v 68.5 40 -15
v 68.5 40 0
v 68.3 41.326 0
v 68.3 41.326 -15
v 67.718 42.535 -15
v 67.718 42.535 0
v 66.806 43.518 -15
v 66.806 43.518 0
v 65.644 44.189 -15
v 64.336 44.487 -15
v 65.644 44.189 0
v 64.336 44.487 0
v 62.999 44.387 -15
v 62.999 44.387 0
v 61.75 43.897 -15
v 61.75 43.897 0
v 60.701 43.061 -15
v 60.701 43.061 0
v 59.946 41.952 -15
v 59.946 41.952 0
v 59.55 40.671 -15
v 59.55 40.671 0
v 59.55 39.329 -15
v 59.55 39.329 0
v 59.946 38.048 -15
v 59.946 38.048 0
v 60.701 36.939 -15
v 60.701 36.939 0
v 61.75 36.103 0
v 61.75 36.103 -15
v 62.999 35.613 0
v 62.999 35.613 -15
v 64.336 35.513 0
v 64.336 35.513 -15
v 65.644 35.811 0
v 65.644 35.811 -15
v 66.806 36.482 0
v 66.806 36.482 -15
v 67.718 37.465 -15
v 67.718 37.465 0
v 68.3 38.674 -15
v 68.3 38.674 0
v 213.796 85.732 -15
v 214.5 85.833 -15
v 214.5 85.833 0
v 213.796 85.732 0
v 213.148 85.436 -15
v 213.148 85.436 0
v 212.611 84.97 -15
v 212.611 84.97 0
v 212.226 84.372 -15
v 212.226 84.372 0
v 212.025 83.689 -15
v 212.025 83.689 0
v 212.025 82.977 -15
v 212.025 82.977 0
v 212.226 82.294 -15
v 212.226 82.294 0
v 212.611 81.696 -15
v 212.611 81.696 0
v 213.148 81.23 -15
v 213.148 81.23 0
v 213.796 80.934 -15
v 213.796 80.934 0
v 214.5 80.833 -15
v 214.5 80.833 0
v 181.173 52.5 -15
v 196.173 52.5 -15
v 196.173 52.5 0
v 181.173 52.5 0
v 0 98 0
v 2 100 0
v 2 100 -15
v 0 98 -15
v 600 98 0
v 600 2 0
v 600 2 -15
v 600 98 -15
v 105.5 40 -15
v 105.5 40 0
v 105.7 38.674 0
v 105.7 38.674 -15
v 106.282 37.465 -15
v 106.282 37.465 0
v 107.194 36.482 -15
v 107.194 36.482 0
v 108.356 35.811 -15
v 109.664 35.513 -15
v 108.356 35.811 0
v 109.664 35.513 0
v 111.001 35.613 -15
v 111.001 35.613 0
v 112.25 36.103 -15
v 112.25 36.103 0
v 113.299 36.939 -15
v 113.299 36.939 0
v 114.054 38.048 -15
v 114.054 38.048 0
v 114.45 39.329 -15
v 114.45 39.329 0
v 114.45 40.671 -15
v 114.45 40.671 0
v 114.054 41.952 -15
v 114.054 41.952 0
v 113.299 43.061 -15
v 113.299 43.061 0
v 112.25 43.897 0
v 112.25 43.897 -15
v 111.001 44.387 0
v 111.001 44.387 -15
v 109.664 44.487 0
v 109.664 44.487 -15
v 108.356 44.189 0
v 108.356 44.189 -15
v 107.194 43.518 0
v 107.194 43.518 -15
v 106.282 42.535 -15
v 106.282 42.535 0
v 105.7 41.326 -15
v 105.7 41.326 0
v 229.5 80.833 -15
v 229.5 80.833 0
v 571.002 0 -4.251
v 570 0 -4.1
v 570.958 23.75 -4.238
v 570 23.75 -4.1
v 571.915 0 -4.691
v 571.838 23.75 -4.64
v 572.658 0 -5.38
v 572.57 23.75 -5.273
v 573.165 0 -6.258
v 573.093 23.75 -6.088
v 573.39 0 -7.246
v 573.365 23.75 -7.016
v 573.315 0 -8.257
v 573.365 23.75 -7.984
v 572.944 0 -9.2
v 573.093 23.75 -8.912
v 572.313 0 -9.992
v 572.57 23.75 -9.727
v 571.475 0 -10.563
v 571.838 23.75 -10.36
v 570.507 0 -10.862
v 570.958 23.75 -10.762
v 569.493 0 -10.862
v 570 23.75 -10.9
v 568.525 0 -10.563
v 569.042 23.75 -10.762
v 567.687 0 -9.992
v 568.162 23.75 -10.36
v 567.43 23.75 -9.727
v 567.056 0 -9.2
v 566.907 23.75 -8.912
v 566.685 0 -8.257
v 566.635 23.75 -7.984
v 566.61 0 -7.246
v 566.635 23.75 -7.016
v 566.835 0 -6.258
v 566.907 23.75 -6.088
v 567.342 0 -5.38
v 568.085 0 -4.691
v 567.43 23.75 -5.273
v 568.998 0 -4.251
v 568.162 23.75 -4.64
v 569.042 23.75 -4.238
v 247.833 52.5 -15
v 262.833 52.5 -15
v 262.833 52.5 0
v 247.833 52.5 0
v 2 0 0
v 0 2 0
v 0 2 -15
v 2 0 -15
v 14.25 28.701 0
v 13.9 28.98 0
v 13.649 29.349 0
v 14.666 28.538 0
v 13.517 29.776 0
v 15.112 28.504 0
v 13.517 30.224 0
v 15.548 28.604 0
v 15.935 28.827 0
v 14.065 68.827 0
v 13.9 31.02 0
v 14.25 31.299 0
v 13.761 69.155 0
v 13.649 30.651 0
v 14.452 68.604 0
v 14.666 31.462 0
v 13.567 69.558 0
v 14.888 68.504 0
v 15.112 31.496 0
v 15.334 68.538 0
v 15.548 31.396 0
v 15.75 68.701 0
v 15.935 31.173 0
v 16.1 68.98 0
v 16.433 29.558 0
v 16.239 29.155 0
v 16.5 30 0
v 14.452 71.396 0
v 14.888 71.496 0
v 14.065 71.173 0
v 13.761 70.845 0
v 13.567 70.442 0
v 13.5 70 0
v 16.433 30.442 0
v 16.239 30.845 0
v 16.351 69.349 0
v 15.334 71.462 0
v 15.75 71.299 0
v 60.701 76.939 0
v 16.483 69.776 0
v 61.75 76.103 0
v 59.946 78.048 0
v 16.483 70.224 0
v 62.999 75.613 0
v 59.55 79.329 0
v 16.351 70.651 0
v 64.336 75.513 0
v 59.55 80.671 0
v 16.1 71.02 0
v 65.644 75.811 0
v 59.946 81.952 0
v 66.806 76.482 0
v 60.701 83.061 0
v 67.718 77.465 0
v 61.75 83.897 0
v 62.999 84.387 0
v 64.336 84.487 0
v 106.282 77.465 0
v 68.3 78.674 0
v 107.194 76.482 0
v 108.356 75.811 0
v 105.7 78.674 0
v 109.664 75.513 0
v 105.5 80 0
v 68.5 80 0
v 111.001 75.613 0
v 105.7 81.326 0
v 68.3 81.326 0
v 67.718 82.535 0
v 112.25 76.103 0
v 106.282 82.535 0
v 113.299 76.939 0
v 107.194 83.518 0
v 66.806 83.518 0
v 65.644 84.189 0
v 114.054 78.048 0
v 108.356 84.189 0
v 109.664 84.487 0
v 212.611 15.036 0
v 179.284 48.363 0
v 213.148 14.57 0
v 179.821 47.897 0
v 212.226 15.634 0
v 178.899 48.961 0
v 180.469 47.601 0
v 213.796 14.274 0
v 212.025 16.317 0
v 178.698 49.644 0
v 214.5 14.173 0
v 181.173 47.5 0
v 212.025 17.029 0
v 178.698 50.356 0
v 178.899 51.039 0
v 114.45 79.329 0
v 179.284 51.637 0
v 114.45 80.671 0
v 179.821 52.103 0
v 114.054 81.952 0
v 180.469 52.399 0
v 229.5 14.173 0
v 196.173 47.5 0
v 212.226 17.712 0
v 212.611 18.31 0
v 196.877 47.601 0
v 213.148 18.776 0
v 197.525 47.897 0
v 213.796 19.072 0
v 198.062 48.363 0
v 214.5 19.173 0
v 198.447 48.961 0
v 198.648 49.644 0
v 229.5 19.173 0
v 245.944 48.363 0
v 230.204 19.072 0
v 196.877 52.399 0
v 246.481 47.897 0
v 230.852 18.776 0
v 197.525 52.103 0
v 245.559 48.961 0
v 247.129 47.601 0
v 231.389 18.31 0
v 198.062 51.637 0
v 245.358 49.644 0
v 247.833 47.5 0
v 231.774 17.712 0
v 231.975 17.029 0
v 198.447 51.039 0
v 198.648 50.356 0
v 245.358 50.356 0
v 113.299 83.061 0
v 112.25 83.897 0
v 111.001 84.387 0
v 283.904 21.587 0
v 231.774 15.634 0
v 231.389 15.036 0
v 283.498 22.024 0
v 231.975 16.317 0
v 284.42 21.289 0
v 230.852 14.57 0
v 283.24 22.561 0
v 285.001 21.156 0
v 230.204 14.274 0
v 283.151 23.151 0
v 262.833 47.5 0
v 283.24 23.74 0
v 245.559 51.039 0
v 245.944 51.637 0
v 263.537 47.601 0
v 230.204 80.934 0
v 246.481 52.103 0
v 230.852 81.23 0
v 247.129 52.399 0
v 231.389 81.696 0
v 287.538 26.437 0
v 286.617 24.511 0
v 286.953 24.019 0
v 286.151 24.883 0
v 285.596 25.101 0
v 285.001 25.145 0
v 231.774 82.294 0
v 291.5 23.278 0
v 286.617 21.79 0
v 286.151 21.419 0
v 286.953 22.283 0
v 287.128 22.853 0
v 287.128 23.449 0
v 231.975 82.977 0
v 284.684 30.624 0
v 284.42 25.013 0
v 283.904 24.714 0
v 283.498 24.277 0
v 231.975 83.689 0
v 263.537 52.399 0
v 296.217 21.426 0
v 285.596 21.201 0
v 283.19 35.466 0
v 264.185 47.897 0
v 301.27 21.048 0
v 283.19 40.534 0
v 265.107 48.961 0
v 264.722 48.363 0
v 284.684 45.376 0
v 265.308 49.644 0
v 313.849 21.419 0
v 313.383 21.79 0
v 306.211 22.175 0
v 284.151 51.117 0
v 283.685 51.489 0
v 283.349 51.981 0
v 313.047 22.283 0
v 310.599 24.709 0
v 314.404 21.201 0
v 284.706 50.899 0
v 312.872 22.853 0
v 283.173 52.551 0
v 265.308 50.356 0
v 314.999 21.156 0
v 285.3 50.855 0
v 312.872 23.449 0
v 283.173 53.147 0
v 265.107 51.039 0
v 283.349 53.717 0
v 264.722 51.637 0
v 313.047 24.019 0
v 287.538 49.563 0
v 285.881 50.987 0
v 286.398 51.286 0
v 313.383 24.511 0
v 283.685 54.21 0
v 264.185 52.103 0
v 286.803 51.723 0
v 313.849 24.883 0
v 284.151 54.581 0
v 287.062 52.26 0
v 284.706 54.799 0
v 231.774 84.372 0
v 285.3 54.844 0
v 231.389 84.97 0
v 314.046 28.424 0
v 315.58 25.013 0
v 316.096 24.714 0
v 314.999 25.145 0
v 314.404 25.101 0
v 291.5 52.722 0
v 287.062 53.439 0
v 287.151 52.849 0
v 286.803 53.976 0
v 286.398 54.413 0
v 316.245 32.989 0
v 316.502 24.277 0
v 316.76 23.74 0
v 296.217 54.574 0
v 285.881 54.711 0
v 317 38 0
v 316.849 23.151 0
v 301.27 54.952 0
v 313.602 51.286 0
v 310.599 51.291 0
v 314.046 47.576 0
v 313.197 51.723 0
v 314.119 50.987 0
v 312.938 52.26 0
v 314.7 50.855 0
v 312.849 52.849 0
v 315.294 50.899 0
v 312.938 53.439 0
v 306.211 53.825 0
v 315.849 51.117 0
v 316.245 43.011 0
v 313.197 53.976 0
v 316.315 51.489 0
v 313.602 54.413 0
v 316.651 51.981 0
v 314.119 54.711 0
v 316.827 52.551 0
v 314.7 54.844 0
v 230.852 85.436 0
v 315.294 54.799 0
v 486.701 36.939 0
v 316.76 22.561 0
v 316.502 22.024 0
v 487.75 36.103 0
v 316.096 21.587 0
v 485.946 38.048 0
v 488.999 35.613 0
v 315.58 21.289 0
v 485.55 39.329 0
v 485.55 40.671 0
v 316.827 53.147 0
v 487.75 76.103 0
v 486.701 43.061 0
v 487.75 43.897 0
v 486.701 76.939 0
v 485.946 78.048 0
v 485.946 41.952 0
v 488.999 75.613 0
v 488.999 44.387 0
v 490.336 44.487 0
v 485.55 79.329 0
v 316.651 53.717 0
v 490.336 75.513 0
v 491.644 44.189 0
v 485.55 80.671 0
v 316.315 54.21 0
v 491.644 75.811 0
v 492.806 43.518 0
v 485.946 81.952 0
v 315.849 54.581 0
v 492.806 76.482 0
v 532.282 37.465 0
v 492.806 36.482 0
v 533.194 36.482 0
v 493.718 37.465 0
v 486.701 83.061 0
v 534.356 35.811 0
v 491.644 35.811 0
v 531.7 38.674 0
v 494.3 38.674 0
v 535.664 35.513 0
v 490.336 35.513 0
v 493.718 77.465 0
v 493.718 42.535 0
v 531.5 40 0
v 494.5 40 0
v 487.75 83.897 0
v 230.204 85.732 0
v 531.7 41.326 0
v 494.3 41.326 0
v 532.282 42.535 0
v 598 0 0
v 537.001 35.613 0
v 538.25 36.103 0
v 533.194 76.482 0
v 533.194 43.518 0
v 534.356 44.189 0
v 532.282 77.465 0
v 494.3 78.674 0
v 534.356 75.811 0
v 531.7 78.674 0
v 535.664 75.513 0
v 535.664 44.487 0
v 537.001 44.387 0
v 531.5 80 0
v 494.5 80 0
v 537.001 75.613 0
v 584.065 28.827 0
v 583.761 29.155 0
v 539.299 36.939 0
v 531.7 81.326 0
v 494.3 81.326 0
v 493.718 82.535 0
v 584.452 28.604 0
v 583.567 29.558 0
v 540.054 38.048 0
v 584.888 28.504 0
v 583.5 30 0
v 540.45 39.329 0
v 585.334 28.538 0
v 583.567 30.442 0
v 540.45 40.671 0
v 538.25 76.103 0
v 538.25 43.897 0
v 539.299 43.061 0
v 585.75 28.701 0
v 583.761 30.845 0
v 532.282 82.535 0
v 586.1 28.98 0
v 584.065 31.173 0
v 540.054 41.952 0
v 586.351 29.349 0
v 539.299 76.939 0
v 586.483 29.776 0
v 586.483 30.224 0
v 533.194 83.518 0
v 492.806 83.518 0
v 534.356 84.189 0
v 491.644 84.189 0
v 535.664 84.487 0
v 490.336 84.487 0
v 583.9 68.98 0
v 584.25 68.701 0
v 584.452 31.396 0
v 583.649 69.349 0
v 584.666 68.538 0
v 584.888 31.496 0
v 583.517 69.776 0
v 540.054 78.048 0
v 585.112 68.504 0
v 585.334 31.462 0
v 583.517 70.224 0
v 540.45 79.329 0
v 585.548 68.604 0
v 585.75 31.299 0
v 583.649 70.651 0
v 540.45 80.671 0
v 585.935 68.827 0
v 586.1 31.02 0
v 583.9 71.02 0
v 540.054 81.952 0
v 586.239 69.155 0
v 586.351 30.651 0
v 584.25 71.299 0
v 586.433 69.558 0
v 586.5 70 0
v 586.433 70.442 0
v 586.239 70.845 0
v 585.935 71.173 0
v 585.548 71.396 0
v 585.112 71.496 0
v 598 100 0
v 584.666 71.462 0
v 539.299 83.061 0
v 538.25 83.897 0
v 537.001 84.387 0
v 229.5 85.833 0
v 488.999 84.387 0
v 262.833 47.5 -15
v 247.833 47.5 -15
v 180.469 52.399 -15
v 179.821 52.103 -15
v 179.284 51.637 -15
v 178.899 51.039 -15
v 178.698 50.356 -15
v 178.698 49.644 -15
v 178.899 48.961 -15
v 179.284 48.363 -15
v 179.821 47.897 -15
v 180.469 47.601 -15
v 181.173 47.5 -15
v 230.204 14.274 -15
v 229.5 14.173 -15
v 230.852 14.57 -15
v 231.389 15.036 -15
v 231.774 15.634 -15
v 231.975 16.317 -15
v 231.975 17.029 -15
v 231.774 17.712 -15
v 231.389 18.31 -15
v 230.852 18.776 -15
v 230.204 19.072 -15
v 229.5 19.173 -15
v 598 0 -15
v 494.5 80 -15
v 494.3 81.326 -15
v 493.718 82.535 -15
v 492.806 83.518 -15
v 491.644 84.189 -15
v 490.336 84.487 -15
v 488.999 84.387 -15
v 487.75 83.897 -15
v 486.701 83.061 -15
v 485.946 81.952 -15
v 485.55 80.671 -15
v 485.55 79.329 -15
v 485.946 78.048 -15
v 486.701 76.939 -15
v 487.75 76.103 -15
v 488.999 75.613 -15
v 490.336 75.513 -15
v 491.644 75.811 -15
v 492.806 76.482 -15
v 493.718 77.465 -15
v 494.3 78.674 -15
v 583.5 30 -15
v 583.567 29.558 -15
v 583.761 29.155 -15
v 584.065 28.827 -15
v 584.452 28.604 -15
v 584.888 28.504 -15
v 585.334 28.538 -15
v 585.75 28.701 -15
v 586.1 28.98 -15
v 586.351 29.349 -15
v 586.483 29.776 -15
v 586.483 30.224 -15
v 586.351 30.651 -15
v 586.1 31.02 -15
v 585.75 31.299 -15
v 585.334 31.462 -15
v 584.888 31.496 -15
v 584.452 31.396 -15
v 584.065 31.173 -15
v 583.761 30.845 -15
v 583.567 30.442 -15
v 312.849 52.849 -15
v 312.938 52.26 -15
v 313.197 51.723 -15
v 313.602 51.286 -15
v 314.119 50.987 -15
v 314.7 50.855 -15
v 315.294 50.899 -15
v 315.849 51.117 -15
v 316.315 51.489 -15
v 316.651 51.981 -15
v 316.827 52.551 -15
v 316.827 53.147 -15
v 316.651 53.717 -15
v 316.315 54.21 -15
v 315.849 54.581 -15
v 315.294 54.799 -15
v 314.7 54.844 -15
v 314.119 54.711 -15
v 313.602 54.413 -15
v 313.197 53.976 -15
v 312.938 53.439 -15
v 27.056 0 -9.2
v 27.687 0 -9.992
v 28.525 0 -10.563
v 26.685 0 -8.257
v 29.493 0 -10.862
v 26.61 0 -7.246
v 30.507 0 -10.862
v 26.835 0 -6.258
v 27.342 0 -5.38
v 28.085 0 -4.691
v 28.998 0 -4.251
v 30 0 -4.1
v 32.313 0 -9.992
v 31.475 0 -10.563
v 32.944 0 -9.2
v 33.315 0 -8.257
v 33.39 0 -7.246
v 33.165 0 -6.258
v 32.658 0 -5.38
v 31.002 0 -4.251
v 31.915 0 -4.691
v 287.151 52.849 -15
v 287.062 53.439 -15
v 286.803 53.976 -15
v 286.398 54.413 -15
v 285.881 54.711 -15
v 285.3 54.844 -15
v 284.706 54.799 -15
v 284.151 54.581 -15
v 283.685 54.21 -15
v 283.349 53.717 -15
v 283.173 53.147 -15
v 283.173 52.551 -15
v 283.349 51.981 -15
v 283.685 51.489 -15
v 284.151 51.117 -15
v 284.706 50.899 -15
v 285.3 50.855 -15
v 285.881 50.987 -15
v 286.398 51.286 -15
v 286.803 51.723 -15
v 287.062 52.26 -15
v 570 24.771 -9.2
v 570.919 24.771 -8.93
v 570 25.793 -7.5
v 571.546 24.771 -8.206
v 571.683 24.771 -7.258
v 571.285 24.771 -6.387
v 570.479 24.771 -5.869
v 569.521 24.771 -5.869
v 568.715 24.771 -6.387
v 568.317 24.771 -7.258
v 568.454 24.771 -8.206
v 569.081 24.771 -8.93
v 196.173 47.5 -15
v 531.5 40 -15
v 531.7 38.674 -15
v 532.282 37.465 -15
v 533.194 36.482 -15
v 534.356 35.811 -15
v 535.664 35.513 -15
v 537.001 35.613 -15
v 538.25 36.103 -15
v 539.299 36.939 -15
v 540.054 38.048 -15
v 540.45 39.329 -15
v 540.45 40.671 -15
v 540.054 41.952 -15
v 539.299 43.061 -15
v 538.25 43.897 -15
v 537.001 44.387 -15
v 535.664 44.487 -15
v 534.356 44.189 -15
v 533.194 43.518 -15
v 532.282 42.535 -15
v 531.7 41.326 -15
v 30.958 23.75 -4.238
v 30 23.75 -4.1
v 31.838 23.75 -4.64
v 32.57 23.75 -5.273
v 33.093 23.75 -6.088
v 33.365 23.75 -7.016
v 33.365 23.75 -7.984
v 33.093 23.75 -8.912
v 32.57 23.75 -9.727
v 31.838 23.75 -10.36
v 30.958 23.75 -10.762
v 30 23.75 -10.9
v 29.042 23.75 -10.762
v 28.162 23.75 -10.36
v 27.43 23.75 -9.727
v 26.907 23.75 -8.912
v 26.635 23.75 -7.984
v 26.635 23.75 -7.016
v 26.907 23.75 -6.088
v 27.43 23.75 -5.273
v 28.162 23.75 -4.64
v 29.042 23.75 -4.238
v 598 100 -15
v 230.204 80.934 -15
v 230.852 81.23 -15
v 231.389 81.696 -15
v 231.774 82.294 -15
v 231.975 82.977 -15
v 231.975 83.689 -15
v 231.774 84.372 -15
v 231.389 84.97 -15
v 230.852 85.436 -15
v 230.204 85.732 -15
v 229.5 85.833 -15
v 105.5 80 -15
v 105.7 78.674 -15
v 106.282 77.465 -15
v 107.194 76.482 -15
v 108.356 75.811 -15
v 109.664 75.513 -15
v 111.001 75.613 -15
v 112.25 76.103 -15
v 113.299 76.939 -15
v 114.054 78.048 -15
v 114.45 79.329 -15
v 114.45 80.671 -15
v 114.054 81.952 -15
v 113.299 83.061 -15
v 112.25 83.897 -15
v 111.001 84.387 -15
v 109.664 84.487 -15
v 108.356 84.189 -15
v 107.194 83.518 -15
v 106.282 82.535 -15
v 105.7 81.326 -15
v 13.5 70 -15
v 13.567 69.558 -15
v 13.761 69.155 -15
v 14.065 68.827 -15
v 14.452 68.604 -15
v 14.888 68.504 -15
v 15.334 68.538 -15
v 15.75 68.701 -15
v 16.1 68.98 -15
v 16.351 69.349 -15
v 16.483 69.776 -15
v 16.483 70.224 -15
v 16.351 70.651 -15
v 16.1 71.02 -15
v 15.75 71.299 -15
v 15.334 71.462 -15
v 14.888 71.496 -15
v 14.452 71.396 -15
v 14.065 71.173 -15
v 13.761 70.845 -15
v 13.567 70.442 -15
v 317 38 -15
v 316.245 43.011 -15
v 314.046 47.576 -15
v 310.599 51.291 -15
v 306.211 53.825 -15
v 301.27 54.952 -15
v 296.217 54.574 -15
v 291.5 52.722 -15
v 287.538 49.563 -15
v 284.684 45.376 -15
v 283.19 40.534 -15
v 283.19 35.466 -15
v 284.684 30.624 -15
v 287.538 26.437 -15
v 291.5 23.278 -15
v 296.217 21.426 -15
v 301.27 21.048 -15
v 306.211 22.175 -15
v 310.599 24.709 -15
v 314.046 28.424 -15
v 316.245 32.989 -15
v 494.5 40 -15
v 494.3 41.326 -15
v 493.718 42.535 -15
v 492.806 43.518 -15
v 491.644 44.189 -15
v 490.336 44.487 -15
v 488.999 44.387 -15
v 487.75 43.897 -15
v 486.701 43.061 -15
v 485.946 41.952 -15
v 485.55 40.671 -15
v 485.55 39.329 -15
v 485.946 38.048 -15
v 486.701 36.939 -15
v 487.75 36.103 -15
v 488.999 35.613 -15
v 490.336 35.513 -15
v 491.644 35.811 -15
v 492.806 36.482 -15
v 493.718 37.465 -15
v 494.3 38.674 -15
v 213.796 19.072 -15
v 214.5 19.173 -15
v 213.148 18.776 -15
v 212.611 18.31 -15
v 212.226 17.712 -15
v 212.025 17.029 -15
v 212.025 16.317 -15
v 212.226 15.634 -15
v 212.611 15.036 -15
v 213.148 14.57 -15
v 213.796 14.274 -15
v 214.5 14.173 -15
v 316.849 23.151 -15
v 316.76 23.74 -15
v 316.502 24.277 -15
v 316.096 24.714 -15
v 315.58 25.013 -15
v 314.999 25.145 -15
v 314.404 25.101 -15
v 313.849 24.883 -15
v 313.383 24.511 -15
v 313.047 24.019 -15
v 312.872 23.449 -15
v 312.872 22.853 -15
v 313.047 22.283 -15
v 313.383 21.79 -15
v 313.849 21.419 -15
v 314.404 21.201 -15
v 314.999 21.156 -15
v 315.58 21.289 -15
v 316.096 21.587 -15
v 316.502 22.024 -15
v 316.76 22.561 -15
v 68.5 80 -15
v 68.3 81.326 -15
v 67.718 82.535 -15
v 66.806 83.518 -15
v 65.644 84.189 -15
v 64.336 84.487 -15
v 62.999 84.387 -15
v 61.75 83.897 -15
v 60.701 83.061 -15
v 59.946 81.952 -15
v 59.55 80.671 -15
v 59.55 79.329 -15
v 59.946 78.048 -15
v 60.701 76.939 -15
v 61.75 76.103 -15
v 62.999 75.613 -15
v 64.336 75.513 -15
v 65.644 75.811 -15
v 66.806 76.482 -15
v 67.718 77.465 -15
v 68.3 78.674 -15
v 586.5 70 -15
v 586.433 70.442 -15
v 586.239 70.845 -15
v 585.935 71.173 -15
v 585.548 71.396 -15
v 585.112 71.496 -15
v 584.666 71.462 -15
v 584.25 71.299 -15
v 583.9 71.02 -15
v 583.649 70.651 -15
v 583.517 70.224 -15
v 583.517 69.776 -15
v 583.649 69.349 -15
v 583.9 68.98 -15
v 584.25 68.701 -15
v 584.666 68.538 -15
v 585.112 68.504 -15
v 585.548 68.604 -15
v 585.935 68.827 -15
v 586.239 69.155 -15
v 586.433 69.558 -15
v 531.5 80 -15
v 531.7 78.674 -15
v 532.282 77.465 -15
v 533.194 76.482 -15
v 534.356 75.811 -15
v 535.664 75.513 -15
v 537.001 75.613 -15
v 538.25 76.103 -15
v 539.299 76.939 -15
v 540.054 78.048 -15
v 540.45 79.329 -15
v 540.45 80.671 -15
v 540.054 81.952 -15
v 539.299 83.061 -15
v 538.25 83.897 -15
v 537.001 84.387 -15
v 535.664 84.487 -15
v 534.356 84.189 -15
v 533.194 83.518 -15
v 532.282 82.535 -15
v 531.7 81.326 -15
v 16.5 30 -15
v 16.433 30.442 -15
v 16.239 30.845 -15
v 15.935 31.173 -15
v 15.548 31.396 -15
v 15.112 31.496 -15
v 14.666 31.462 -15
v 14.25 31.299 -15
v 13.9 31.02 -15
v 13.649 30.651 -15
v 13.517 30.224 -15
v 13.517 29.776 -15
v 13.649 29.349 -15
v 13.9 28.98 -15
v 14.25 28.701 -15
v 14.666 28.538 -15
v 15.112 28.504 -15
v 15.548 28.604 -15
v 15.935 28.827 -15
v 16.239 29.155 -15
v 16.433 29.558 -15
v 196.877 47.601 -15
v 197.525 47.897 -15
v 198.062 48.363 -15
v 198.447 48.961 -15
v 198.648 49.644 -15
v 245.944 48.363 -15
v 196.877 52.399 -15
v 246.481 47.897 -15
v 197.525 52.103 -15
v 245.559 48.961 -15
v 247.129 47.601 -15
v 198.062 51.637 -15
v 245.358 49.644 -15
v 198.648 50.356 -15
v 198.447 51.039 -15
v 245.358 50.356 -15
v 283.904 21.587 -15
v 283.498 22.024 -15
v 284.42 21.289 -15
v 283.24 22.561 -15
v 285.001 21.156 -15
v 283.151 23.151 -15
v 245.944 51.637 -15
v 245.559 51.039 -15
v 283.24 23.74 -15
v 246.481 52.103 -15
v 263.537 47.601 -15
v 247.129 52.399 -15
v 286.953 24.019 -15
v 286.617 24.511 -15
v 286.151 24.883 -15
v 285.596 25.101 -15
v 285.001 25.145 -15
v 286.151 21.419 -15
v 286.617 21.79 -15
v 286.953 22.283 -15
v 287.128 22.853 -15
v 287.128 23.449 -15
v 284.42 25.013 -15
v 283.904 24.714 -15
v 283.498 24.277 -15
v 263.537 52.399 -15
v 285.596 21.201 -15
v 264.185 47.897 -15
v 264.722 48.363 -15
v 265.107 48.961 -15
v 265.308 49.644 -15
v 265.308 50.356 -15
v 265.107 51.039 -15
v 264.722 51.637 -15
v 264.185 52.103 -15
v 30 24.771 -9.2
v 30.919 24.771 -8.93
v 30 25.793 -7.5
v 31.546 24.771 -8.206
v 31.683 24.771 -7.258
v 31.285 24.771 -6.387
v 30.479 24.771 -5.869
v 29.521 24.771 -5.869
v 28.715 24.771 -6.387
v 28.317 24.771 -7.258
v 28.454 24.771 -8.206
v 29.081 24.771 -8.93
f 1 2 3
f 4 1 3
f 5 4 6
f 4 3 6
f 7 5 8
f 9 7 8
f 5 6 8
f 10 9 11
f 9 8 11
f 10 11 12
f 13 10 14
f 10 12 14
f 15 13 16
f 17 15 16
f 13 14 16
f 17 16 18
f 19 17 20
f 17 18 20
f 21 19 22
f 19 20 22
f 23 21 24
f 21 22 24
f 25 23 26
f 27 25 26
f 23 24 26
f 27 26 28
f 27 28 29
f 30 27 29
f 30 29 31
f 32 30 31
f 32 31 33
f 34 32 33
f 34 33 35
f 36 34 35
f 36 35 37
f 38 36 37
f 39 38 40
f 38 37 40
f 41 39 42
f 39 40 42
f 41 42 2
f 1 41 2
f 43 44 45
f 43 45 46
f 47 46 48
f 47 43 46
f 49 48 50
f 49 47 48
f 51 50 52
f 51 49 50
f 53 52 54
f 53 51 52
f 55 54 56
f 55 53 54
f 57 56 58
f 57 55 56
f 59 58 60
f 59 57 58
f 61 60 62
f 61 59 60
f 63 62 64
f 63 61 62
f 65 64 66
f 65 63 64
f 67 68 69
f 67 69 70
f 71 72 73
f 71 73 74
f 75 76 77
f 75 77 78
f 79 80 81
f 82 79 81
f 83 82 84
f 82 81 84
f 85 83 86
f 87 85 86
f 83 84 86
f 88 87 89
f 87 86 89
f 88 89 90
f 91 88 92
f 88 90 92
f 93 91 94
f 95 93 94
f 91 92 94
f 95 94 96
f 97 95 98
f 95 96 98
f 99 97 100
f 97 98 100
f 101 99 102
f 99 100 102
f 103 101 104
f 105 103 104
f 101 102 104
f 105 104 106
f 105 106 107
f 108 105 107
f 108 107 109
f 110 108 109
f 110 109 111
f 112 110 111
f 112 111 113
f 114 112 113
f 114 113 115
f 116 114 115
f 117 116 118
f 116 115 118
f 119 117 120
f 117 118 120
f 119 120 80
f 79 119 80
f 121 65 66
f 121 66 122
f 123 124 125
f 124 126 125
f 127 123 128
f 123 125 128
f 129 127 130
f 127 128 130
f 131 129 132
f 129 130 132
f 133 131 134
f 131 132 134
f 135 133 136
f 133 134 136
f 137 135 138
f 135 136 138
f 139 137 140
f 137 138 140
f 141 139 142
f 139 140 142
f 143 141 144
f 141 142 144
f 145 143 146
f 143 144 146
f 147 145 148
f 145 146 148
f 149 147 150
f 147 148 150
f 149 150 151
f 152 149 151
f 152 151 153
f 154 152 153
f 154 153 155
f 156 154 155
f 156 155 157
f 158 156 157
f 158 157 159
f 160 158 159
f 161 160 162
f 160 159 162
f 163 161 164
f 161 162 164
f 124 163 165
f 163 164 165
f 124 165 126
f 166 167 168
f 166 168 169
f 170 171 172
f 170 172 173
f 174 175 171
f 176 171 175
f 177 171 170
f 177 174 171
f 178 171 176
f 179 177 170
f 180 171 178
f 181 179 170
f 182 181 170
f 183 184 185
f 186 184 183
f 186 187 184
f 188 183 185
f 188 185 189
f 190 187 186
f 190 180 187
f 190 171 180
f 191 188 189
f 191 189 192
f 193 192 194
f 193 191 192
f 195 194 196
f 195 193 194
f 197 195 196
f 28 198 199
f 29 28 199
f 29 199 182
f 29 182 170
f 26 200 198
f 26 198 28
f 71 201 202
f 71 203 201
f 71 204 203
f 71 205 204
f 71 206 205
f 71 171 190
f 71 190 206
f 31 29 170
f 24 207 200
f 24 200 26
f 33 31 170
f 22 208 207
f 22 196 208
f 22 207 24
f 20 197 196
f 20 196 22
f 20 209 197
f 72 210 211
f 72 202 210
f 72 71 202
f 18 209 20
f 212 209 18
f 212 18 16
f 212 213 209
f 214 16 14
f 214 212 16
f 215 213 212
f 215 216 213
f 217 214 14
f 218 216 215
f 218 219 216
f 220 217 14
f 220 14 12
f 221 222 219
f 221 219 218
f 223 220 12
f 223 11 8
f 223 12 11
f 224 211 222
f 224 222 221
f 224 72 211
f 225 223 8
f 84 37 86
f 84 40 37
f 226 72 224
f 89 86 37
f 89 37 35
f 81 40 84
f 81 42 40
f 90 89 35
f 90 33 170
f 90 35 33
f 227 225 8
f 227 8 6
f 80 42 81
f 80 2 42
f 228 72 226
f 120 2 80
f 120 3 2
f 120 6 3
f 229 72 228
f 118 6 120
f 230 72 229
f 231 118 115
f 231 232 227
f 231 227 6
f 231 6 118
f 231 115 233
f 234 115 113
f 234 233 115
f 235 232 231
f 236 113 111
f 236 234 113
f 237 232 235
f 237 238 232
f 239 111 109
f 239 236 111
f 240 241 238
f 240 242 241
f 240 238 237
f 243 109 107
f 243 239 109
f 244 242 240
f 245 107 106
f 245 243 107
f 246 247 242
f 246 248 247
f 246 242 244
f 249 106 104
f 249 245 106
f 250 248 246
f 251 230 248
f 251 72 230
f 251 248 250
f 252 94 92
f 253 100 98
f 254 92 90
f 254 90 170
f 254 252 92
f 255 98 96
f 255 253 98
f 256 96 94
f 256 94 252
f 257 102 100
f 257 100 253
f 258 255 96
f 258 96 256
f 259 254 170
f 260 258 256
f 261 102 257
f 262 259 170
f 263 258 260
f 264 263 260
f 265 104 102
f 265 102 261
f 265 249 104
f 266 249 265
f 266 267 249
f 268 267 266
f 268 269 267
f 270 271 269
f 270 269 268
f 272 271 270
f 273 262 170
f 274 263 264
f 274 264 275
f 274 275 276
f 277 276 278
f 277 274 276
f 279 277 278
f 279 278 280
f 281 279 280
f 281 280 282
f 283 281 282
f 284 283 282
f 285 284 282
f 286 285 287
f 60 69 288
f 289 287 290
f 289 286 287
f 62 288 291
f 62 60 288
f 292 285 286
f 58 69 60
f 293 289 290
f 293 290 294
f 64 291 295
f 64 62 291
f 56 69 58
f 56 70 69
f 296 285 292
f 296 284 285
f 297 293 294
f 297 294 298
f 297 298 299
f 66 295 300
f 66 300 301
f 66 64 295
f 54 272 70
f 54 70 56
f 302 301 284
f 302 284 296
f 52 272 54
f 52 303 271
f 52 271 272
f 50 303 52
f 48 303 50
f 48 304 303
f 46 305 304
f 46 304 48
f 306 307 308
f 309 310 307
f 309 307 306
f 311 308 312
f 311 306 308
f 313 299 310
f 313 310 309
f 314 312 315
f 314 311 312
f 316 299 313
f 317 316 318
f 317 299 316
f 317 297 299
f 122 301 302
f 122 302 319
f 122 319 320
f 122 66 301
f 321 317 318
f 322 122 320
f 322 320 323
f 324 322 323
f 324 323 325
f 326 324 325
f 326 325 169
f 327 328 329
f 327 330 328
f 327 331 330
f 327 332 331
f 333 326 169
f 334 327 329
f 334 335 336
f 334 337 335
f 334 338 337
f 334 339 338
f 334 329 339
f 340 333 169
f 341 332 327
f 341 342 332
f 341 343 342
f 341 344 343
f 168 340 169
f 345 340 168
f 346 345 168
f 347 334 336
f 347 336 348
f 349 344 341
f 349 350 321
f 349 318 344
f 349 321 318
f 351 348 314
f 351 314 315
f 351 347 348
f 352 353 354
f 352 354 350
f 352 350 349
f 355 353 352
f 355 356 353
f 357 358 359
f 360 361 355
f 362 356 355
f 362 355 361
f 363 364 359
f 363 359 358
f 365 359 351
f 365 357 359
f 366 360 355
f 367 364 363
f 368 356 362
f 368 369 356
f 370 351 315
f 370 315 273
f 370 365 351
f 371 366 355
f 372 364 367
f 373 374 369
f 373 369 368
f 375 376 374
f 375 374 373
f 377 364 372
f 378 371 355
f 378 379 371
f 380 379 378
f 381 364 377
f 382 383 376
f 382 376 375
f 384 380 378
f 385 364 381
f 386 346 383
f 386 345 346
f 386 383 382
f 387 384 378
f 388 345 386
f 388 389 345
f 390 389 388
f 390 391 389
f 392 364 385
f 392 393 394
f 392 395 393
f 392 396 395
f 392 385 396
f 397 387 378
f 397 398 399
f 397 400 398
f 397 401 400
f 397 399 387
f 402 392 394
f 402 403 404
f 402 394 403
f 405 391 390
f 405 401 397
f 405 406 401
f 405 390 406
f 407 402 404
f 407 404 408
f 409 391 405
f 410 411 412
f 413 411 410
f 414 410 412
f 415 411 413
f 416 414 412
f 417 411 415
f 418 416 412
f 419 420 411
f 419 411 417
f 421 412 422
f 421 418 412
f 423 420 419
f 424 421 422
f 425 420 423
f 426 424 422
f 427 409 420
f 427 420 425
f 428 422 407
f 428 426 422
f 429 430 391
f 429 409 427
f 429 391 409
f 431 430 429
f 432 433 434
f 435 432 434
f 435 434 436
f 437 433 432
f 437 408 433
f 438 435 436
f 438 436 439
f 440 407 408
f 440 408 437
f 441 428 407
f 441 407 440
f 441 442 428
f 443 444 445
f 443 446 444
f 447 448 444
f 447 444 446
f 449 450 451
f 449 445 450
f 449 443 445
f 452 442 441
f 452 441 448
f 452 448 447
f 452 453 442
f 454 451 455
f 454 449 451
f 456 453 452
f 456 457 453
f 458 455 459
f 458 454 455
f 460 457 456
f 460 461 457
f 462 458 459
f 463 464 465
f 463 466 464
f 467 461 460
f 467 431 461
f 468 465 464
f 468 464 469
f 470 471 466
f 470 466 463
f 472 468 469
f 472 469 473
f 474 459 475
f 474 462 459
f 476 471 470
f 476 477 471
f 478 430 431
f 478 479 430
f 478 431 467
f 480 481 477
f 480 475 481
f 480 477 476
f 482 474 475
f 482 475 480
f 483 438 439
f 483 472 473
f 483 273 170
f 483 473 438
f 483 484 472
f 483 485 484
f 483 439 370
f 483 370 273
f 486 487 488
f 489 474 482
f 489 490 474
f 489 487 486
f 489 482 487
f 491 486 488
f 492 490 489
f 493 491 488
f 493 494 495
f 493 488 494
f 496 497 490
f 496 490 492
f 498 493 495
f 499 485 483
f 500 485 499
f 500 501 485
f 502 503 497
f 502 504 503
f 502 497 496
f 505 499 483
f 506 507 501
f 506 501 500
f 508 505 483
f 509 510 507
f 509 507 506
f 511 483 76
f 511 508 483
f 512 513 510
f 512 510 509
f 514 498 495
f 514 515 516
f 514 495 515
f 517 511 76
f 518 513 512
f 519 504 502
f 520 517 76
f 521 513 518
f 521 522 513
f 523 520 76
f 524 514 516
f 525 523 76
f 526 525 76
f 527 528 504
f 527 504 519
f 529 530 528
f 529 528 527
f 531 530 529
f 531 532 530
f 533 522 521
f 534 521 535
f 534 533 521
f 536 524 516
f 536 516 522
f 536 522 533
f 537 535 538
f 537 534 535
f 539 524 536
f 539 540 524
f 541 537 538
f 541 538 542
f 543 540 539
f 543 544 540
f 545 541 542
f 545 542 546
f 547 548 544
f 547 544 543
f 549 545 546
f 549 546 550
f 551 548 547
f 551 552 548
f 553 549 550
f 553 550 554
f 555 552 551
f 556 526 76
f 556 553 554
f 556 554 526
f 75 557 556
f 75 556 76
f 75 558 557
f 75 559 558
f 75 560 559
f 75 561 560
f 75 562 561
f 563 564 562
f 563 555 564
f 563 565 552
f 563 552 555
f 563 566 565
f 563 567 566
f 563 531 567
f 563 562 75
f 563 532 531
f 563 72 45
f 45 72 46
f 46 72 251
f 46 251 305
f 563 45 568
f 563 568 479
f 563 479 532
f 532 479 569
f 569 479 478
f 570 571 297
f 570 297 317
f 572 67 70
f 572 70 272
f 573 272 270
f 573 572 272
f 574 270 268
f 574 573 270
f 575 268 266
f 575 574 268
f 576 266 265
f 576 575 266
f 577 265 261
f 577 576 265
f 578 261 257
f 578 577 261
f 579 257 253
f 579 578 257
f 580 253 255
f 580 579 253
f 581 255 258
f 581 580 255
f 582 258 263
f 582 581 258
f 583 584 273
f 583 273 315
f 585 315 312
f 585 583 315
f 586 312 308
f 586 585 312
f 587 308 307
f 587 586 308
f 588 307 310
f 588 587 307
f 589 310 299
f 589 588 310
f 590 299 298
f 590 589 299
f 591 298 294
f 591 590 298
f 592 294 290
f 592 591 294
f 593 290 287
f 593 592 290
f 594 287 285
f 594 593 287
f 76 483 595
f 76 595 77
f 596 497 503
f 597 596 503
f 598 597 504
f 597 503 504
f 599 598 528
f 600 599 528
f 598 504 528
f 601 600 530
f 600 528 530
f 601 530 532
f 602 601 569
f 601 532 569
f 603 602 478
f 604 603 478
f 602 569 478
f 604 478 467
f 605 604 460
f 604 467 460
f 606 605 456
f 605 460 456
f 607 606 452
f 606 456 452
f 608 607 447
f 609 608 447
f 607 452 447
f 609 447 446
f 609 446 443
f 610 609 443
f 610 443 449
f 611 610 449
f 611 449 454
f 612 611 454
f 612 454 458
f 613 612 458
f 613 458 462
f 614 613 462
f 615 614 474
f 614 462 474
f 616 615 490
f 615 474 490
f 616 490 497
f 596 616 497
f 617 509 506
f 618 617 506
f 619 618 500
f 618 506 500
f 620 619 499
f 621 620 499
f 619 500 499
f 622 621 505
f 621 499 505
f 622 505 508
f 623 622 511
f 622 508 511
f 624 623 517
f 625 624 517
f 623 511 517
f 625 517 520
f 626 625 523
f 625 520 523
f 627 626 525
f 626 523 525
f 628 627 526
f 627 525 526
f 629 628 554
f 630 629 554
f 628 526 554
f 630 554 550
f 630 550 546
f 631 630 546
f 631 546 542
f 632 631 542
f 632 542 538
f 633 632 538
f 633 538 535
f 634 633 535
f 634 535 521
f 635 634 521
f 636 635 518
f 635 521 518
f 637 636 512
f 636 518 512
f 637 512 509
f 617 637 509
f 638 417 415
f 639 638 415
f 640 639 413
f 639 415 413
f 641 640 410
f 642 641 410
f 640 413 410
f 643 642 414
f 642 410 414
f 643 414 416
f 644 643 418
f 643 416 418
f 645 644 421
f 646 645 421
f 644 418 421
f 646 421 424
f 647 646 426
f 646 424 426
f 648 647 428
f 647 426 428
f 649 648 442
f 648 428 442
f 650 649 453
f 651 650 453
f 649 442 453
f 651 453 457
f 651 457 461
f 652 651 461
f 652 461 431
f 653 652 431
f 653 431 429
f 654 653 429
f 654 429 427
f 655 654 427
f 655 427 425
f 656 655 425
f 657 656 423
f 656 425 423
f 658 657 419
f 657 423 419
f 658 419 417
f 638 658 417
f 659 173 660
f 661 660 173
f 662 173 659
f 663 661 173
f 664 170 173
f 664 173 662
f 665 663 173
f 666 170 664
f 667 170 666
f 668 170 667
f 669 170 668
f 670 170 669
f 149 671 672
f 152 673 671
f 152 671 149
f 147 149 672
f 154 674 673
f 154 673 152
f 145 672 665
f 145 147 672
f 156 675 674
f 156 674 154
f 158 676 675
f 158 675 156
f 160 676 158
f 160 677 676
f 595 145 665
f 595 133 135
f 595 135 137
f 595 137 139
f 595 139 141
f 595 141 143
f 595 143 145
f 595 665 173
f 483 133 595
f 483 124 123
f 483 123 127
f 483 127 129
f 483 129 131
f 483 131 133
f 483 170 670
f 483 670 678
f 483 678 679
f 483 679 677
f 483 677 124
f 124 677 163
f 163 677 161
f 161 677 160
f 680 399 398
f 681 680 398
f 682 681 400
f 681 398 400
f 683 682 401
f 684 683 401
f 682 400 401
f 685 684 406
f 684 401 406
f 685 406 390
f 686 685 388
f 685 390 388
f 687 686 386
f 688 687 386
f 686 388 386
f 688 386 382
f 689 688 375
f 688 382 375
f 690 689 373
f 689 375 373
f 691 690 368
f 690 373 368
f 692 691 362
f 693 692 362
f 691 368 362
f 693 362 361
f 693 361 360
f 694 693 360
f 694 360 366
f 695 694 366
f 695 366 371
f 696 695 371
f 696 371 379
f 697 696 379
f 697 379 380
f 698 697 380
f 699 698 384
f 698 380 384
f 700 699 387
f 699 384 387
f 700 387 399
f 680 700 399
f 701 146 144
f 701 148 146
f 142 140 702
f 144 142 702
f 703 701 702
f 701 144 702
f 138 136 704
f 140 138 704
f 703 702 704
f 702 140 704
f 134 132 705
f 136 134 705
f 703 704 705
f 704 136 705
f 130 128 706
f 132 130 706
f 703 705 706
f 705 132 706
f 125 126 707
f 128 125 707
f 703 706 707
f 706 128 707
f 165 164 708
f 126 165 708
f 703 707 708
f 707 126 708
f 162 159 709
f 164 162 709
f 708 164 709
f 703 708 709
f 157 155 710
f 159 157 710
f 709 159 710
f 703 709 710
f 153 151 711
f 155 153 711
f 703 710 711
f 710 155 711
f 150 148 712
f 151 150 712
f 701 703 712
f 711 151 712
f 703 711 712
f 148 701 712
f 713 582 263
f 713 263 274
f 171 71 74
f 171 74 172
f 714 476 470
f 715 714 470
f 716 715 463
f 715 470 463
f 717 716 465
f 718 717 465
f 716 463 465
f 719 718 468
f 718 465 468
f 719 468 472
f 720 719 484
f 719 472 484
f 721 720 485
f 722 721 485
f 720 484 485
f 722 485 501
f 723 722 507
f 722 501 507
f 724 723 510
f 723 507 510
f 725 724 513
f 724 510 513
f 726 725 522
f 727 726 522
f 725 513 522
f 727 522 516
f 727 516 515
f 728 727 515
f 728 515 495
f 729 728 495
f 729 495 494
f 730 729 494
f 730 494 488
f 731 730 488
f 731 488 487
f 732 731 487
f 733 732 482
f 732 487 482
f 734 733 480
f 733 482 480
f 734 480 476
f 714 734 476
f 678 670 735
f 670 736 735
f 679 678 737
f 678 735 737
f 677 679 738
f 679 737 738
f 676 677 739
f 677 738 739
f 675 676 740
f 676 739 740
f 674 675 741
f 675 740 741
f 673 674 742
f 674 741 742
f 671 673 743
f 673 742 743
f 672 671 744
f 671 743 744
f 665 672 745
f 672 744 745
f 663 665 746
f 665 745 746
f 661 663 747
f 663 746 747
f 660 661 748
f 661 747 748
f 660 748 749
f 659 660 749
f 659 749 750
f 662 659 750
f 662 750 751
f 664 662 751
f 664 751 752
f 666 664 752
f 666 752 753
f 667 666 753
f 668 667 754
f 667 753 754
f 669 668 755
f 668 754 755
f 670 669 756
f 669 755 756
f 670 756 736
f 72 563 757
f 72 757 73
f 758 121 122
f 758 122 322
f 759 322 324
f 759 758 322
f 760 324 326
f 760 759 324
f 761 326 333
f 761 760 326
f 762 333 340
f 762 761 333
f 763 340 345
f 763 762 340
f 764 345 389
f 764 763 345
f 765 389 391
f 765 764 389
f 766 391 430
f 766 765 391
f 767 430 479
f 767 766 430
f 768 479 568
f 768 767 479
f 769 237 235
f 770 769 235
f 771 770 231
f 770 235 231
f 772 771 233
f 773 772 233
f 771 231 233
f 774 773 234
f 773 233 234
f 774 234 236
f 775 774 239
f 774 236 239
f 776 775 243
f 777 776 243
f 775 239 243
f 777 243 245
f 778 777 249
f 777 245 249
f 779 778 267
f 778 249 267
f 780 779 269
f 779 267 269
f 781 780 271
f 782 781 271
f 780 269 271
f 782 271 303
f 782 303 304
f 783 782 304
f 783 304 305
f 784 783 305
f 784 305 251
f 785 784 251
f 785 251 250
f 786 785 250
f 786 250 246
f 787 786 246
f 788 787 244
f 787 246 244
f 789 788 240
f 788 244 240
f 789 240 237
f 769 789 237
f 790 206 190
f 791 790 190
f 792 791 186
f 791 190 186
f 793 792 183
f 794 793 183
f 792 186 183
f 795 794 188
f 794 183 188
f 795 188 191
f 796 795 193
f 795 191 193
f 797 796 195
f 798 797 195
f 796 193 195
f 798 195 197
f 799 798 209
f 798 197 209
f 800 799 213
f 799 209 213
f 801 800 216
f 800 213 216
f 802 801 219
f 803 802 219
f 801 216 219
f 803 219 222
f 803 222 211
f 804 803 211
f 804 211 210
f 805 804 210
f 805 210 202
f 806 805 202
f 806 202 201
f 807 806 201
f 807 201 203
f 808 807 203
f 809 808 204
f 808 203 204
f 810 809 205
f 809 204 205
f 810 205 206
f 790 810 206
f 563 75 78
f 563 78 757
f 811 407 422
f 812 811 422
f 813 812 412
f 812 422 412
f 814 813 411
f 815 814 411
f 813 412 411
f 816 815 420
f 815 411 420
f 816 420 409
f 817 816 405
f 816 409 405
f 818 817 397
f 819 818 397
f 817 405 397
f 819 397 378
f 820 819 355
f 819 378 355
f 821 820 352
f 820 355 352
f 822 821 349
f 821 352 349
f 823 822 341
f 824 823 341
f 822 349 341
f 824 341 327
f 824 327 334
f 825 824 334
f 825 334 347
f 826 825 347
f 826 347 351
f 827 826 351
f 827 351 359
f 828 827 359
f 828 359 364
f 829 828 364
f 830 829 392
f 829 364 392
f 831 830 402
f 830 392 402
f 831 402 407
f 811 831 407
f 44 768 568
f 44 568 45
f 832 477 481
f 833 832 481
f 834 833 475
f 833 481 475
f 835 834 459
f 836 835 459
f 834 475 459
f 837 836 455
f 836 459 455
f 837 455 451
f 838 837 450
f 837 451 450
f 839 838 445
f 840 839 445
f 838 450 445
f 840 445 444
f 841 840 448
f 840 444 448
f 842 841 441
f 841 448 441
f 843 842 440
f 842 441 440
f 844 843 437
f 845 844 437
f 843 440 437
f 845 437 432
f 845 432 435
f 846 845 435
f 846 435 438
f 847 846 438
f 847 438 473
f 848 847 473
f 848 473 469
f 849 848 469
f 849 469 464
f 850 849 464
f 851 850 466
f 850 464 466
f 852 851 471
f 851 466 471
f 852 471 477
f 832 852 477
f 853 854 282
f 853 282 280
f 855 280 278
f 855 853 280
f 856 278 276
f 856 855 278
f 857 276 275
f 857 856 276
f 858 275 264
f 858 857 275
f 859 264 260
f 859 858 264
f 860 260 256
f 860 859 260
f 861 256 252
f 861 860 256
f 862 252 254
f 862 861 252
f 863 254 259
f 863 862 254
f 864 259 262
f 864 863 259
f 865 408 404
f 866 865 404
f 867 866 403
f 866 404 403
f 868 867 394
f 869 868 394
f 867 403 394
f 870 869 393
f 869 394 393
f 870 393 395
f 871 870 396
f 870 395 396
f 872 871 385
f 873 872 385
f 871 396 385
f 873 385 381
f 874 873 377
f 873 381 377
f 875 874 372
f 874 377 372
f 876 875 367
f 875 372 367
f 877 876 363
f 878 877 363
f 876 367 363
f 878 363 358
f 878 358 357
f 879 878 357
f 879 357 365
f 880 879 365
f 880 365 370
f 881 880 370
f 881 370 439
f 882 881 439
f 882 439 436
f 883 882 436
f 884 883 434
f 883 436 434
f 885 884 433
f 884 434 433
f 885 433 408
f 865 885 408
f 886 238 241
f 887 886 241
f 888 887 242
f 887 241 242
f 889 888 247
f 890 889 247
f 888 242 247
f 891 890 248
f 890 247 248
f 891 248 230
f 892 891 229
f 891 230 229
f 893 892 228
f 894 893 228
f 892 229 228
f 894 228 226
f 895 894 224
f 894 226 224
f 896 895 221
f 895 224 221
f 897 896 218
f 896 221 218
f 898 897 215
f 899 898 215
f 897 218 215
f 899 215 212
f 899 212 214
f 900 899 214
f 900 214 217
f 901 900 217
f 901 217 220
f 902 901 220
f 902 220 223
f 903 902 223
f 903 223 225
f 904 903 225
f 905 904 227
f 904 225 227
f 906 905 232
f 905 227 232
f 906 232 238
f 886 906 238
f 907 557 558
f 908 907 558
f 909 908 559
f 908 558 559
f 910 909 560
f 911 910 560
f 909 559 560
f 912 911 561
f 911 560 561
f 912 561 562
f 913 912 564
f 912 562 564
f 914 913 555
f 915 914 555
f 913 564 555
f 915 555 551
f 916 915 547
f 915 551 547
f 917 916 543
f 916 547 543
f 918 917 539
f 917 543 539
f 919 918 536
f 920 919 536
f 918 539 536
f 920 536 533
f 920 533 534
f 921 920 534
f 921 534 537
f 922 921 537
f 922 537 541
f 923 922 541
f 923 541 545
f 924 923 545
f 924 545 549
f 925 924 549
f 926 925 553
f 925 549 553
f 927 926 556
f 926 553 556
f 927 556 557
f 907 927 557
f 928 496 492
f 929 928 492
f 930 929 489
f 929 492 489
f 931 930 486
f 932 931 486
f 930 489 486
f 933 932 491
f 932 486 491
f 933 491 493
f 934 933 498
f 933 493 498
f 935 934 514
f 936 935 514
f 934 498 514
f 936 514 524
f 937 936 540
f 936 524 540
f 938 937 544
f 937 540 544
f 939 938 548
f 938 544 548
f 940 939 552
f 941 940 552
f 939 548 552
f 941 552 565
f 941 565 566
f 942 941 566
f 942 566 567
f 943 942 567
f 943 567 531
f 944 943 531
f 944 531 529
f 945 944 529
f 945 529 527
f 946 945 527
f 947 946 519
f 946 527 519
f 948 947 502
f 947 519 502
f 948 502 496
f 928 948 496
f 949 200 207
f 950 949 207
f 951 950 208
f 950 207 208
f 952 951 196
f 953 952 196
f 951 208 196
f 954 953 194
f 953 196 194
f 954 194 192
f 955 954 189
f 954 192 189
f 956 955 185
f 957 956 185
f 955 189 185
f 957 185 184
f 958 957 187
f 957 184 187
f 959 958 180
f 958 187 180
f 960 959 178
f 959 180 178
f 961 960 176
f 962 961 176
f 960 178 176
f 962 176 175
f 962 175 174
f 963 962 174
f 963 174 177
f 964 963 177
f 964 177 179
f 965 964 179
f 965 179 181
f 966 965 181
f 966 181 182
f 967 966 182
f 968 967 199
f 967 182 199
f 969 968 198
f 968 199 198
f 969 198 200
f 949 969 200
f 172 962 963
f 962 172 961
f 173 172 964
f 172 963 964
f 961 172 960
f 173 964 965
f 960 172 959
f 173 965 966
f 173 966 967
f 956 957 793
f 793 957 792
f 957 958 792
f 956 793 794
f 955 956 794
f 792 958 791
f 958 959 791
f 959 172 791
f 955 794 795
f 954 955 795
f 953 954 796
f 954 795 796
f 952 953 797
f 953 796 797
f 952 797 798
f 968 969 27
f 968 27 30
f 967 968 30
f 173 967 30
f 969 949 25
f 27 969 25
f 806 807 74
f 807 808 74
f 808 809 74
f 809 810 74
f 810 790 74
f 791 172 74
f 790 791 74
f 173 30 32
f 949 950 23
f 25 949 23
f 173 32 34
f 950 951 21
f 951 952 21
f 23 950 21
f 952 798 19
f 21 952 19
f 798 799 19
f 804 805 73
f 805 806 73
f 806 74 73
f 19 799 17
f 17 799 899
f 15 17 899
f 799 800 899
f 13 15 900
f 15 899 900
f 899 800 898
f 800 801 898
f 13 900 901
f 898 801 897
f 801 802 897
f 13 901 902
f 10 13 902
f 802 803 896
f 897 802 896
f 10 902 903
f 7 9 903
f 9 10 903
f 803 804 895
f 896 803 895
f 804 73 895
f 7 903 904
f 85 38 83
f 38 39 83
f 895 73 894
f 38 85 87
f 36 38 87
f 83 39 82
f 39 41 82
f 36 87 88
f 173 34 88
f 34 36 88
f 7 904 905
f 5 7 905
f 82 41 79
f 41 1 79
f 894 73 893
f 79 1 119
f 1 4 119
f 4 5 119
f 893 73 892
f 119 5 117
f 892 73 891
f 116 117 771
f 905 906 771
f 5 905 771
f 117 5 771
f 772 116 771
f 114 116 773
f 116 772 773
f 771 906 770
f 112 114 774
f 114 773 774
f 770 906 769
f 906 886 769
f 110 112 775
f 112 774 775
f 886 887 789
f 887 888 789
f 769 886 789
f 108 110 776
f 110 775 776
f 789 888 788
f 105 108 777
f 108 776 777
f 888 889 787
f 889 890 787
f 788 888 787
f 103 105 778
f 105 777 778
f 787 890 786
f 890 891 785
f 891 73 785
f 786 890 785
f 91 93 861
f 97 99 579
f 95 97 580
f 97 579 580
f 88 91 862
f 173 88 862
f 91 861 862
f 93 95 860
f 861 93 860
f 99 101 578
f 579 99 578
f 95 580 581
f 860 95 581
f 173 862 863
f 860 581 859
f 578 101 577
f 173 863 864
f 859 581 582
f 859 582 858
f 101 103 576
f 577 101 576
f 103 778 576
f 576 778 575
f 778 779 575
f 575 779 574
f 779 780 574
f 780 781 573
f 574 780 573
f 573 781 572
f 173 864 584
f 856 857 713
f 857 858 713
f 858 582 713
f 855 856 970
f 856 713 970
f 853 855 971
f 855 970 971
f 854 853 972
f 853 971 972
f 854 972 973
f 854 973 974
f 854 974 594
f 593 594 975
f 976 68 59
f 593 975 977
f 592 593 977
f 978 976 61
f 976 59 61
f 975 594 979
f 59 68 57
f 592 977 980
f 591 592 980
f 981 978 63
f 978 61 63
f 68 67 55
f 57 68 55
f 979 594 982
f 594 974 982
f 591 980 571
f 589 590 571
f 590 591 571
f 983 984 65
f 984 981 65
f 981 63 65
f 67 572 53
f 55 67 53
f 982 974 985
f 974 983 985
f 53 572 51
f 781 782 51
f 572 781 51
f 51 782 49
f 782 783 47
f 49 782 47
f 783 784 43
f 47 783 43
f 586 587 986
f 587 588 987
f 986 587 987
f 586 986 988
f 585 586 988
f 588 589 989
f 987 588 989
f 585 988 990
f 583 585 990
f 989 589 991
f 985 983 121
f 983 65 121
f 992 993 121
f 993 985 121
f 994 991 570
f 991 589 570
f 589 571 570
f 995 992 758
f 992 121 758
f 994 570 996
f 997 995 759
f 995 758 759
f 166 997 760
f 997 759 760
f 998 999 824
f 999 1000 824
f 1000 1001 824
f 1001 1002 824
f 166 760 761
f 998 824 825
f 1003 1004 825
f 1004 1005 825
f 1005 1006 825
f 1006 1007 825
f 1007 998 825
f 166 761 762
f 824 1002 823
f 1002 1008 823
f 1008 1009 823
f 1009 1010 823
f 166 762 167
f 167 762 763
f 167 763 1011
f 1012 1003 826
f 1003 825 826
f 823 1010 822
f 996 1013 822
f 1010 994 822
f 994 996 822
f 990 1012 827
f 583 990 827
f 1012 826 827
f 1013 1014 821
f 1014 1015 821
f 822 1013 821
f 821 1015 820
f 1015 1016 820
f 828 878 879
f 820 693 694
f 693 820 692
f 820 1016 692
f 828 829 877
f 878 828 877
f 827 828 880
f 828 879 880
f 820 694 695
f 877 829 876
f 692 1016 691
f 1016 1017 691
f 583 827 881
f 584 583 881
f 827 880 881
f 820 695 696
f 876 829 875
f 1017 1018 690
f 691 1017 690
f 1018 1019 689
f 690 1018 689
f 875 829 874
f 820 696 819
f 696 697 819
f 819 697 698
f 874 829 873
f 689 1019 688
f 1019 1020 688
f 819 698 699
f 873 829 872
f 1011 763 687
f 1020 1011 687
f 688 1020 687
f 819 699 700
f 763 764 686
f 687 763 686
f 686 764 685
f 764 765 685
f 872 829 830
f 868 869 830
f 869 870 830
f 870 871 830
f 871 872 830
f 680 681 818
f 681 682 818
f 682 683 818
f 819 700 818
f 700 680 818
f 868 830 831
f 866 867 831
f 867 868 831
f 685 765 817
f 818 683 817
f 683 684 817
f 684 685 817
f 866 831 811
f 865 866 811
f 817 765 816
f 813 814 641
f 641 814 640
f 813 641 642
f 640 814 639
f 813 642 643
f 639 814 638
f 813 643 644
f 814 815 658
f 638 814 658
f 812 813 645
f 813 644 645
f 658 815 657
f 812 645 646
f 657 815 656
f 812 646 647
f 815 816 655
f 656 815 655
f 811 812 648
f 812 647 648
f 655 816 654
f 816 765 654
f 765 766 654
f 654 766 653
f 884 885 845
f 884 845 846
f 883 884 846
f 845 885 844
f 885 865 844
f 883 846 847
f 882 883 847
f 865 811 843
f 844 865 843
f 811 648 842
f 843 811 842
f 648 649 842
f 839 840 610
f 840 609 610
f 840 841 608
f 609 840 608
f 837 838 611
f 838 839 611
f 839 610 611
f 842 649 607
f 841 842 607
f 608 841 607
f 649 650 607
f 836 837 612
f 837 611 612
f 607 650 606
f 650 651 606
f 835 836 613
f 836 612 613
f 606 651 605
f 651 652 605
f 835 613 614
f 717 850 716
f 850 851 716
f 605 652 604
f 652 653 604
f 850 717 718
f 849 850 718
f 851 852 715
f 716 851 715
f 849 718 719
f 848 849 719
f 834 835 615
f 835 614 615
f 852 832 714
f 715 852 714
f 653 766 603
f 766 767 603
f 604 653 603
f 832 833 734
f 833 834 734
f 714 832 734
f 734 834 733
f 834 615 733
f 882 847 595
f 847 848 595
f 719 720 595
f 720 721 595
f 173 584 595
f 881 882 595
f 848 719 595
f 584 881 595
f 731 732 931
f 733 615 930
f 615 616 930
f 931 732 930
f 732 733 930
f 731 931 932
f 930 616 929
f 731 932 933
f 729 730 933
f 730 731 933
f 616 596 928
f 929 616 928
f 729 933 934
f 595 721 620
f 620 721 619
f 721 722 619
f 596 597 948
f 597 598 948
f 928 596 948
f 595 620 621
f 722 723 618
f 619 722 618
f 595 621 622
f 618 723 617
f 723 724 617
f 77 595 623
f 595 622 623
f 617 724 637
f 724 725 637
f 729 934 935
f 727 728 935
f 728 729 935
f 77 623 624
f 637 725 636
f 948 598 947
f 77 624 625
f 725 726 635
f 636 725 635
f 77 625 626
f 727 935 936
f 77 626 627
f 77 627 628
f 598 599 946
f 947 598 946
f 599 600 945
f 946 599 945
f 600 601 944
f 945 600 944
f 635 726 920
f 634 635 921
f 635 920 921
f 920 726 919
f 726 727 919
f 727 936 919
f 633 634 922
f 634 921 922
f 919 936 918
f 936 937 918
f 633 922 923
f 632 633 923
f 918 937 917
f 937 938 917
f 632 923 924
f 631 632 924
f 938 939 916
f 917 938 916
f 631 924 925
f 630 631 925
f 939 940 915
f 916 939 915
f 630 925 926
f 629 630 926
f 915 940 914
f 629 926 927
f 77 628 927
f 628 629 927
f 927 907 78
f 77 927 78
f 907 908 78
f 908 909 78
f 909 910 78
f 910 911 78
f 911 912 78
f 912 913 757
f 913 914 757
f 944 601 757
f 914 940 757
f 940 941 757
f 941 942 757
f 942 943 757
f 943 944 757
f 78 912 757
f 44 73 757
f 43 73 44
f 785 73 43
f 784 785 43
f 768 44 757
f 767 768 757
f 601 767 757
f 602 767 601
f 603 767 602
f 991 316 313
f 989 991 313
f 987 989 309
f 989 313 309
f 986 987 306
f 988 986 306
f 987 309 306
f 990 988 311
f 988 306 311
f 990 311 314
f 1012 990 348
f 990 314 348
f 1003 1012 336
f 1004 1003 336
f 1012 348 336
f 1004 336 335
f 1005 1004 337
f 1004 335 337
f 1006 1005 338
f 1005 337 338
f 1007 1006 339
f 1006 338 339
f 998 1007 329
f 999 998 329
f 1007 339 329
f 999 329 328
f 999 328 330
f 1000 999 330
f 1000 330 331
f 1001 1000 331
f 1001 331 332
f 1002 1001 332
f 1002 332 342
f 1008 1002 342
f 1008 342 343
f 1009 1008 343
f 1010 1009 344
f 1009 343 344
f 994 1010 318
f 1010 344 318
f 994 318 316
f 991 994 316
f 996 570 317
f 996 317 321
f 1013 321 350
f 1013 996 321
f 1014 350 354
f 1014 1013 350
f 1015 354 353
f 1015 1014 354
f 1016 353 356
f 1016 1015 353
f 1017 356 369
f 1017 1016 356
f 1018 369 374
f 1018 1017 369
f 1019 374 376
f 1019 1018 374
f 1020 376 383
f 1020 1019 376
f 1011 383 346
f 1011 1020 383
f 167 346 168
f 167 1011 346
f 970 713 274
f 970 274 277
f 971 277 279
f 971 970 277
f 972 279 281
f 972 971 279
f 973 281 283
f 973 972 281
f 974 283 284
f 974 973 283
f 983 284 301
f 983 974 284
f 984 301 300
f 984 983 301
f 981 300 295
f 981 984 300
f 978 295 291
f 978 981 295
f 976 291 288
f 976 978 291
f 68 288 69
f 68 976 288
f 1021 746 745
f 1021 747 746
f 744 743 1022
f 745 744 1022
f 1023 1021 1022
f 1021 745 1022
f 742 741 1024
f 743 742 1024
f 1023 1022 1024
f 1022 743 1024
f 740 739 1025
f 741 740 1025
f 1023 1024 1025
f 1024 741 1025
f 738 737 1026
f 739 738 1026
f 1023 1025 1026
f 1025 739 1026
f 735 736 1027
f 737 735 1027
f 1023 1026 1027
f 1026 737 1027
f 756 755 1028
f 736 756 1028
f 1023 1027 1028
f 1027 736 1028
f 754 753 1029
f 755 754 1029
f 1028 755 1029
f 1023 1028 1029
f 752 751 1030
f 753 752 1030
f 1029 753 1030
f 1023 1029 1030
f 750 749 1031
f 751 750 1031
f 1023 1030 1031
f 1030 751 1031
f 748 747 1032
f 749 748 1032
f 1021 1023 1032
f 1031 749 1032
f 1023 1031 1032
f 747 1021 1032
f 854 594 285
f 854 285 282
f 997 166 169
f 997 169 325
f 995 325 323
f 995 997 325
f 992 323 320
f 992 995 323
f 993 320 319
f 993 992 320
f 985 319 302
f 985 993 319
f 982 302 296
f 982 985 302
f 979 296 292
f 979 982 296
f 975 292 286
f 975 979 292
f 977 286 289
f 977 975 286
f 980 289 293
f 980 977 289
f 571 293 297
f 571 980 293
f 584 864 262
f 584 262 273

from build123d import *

# Parameters (mm, degrees)
SCHIZZO1_R            = 17
SCHIZZO1_R_2          = 2
SCHIZZO1_R_3          = 4.5
SCHIZZO1_R_4          = 1.5
BOSS_EXTRUDE1_DEPTH   = 15
M8_TAPPED_HOLE1_D     = 6.8
M8_TAPPED_HOLE1_DEPTH = 23.75
M8_TAPPED_HOLE1_TIP   = 2.042926105
CUT_EXTRUDE1_DEPTH    = 609.461173782


with BuildPart() as part:
    # Schizzo1 → Boss-Extrude1 (new body)
    with BuildSketch(Plane.XY):
        Polygon((2, 0), (598, 0), (600, 2), (600, 98), (598, 100), (2, 100), (0, 98), (0, 2), align=None)
        with Locations((300, 38)):
            Circle(SCHIZZO1_R, mode=Mode.SUBTRACT)
        with Locations(Location((314.849242405, 52.849242405, 0), (0, 0, 180))):
            Circle(SCHIZZO1_R_2, mode=Mode.SUBTRACT)
        with Locations((314.849242405, 23.150757595)):
            Circle(SCHIZZO1_R_2, mode=Mode.SUBTRACT)
        with Locations(Location((285.150757595, 23.150757595, 0), (0, 0, 180))):
            Circle(SCHIZZO1_R_2, mode=Mode.SUBTRACT)
        with Locations(Location((536, 40, 0), (0, 0, 180))):
            Circle(SCHIZZO1_R_3, mode=Mode.SUBTRACT)
        with Locations(Location((536, 80, 0), (0, 0, 180))):
            Circle(SCHIZZO1_R_3, mode=Mode.SUBTRACT)
        with Locations((490, 40)):
            Circle(SCHIZZO1_R_3, mode=Mode.SUBTRACT)
        with Locations((490, 80)):
            Circle(SCHIZZO1_R_3, mode=Mode.SUBTRACT)
        with Locations((585, 70)):
            Circle(SCHIZZO1_R_4, mode=Mode.SUBTRACT)
        with Locations(Location((585, 30, 0), (0, 0, 180))):
            Circle(SCHIZZO1_R_4, mode=Mode.SUBTRACT)
        with Locations((15, 30)):
            Circle(SCHIZZO1_R_4, mode=Mode.SUBTRACT)
        with Locations((285.150757595, 52.849242405)):
            Circle(SCHIZZO1_R_2, mode=Mode.SUBTRACT)
        with Locations(Location((15, 70, 0), (0, 0, 180))):
            Circle(SCHIZZO1_R_4, mode=Mode.SUBTRACT)
        with Locations(Location((110, 80, 0), (0, 0, 180))):
            Circle(SCHIZZO1_R_3, mode=Mode.SUBTRACT)
        with Locations(Location((110, 40, 0), (0, 0, 180))):
            Circle(SCHIZZO1_R_3, mode=Mode.SUBTRACT)
        with Locations((64, 80)):
            Circle(SCHIZZO1_R_3, mode=Mode.SUBTRACT)
        with Locations((64, 40)):
            Circle(SCHIZZO1_R_3, mode=Mode.SUBTRACT)
    extrude(amount=-BOSS_EXTRUDE1_DEPTH)

    # M8 Tapped Hole1
    with Locations(Plane(origin=(30, 0, -7.5), x_dir=(0, 0, -1), z_dir=(0, -1, 0))):
        with Locations((0, 0), (0, 540)):
            Hole(M8_TAPPED_HOLE1_D / 2, depth=M8_TAPPED_HOLE1_DEPTH)
            with Locations((0, 0, -(M8_TAPPED_HOLE1_DEPTH + M8_TAPPED_HOLE1_TIP / 2))):  # 118° drill point
                Cone(0, M8_TAPPED_HOLE1_D / 2, M8_TAPPED_HOLE1_TIP, mode=Mode.SUBTRACT)

    # Sketch7 → Cut-Extrude1 (cut, through all)
    with BuildSketch(Plane(origin=(0, 0, -15), x_dir=(-1, 0, 0), z_dir=(0, 0, -1))):
        with BuildLine():
            Line((-214.5, 80.833013665), (-229.5, 80.833013665))
            ThreePointArc((-229.5, 80.833013665), (-232, 83.333013665), (-229.5, 85.833013665))
            Line((-229.5, 85.833013665), (-214.5, 85.833013665))
            ThreePointArc((-214.5, 85.833013665), (-212, 83.333013665), (-214.5, 80.833013665))
        make_face()
        with BuildLine():
            Line((-247.833013665, 47.5), (-262.833013665, 47.5))
            ThreePointArc((-262.833013665, 47.5), (-265.333013665, 50), (-262.833013665, 52.5))
            Line((-262.833013665, 52.5), (-247.833013665, 52.5))
            ThreePointArc((-247.833013665, 52.5), (-245.333013665, 50), (-247.833013665, 47.5))
        make_face()
        with BuildLine():
            Line((-181.173013665, 47.5), (-196.173013665, 47.5))
            ThreePointArc((-196.173013665, 47.5), (-198.673013665, 50), (-196.173013665, 52.5))
            Line((-196.173013665, 52.5), (-181.173013665, 52.5))
            ThreePointArc((-181.173013665, 52.5), (-178.673013665, 50), (-181.173013665, 47.5))
        make_face()
        with BuildLine():
            Line((-214.5, 14.173013665), (-229.5, 14.173013665))
            ThreePointArc((-229.5, 14.173013665), (-232, 16.673013665), (-229.5, 19.173013665))
            Line((-229.5, 19.173013665), (-214.5, 19.173013665))
            ThreePointArc((-214.5, 19.173013665), (-212, 16.673013665), (-214.5, 14.173013665))
        make_face()
    extrude(amount=-CUT_EXTRUDE1_DEPTH, mode=Mode.SUBTRACT)


solid = part.part
